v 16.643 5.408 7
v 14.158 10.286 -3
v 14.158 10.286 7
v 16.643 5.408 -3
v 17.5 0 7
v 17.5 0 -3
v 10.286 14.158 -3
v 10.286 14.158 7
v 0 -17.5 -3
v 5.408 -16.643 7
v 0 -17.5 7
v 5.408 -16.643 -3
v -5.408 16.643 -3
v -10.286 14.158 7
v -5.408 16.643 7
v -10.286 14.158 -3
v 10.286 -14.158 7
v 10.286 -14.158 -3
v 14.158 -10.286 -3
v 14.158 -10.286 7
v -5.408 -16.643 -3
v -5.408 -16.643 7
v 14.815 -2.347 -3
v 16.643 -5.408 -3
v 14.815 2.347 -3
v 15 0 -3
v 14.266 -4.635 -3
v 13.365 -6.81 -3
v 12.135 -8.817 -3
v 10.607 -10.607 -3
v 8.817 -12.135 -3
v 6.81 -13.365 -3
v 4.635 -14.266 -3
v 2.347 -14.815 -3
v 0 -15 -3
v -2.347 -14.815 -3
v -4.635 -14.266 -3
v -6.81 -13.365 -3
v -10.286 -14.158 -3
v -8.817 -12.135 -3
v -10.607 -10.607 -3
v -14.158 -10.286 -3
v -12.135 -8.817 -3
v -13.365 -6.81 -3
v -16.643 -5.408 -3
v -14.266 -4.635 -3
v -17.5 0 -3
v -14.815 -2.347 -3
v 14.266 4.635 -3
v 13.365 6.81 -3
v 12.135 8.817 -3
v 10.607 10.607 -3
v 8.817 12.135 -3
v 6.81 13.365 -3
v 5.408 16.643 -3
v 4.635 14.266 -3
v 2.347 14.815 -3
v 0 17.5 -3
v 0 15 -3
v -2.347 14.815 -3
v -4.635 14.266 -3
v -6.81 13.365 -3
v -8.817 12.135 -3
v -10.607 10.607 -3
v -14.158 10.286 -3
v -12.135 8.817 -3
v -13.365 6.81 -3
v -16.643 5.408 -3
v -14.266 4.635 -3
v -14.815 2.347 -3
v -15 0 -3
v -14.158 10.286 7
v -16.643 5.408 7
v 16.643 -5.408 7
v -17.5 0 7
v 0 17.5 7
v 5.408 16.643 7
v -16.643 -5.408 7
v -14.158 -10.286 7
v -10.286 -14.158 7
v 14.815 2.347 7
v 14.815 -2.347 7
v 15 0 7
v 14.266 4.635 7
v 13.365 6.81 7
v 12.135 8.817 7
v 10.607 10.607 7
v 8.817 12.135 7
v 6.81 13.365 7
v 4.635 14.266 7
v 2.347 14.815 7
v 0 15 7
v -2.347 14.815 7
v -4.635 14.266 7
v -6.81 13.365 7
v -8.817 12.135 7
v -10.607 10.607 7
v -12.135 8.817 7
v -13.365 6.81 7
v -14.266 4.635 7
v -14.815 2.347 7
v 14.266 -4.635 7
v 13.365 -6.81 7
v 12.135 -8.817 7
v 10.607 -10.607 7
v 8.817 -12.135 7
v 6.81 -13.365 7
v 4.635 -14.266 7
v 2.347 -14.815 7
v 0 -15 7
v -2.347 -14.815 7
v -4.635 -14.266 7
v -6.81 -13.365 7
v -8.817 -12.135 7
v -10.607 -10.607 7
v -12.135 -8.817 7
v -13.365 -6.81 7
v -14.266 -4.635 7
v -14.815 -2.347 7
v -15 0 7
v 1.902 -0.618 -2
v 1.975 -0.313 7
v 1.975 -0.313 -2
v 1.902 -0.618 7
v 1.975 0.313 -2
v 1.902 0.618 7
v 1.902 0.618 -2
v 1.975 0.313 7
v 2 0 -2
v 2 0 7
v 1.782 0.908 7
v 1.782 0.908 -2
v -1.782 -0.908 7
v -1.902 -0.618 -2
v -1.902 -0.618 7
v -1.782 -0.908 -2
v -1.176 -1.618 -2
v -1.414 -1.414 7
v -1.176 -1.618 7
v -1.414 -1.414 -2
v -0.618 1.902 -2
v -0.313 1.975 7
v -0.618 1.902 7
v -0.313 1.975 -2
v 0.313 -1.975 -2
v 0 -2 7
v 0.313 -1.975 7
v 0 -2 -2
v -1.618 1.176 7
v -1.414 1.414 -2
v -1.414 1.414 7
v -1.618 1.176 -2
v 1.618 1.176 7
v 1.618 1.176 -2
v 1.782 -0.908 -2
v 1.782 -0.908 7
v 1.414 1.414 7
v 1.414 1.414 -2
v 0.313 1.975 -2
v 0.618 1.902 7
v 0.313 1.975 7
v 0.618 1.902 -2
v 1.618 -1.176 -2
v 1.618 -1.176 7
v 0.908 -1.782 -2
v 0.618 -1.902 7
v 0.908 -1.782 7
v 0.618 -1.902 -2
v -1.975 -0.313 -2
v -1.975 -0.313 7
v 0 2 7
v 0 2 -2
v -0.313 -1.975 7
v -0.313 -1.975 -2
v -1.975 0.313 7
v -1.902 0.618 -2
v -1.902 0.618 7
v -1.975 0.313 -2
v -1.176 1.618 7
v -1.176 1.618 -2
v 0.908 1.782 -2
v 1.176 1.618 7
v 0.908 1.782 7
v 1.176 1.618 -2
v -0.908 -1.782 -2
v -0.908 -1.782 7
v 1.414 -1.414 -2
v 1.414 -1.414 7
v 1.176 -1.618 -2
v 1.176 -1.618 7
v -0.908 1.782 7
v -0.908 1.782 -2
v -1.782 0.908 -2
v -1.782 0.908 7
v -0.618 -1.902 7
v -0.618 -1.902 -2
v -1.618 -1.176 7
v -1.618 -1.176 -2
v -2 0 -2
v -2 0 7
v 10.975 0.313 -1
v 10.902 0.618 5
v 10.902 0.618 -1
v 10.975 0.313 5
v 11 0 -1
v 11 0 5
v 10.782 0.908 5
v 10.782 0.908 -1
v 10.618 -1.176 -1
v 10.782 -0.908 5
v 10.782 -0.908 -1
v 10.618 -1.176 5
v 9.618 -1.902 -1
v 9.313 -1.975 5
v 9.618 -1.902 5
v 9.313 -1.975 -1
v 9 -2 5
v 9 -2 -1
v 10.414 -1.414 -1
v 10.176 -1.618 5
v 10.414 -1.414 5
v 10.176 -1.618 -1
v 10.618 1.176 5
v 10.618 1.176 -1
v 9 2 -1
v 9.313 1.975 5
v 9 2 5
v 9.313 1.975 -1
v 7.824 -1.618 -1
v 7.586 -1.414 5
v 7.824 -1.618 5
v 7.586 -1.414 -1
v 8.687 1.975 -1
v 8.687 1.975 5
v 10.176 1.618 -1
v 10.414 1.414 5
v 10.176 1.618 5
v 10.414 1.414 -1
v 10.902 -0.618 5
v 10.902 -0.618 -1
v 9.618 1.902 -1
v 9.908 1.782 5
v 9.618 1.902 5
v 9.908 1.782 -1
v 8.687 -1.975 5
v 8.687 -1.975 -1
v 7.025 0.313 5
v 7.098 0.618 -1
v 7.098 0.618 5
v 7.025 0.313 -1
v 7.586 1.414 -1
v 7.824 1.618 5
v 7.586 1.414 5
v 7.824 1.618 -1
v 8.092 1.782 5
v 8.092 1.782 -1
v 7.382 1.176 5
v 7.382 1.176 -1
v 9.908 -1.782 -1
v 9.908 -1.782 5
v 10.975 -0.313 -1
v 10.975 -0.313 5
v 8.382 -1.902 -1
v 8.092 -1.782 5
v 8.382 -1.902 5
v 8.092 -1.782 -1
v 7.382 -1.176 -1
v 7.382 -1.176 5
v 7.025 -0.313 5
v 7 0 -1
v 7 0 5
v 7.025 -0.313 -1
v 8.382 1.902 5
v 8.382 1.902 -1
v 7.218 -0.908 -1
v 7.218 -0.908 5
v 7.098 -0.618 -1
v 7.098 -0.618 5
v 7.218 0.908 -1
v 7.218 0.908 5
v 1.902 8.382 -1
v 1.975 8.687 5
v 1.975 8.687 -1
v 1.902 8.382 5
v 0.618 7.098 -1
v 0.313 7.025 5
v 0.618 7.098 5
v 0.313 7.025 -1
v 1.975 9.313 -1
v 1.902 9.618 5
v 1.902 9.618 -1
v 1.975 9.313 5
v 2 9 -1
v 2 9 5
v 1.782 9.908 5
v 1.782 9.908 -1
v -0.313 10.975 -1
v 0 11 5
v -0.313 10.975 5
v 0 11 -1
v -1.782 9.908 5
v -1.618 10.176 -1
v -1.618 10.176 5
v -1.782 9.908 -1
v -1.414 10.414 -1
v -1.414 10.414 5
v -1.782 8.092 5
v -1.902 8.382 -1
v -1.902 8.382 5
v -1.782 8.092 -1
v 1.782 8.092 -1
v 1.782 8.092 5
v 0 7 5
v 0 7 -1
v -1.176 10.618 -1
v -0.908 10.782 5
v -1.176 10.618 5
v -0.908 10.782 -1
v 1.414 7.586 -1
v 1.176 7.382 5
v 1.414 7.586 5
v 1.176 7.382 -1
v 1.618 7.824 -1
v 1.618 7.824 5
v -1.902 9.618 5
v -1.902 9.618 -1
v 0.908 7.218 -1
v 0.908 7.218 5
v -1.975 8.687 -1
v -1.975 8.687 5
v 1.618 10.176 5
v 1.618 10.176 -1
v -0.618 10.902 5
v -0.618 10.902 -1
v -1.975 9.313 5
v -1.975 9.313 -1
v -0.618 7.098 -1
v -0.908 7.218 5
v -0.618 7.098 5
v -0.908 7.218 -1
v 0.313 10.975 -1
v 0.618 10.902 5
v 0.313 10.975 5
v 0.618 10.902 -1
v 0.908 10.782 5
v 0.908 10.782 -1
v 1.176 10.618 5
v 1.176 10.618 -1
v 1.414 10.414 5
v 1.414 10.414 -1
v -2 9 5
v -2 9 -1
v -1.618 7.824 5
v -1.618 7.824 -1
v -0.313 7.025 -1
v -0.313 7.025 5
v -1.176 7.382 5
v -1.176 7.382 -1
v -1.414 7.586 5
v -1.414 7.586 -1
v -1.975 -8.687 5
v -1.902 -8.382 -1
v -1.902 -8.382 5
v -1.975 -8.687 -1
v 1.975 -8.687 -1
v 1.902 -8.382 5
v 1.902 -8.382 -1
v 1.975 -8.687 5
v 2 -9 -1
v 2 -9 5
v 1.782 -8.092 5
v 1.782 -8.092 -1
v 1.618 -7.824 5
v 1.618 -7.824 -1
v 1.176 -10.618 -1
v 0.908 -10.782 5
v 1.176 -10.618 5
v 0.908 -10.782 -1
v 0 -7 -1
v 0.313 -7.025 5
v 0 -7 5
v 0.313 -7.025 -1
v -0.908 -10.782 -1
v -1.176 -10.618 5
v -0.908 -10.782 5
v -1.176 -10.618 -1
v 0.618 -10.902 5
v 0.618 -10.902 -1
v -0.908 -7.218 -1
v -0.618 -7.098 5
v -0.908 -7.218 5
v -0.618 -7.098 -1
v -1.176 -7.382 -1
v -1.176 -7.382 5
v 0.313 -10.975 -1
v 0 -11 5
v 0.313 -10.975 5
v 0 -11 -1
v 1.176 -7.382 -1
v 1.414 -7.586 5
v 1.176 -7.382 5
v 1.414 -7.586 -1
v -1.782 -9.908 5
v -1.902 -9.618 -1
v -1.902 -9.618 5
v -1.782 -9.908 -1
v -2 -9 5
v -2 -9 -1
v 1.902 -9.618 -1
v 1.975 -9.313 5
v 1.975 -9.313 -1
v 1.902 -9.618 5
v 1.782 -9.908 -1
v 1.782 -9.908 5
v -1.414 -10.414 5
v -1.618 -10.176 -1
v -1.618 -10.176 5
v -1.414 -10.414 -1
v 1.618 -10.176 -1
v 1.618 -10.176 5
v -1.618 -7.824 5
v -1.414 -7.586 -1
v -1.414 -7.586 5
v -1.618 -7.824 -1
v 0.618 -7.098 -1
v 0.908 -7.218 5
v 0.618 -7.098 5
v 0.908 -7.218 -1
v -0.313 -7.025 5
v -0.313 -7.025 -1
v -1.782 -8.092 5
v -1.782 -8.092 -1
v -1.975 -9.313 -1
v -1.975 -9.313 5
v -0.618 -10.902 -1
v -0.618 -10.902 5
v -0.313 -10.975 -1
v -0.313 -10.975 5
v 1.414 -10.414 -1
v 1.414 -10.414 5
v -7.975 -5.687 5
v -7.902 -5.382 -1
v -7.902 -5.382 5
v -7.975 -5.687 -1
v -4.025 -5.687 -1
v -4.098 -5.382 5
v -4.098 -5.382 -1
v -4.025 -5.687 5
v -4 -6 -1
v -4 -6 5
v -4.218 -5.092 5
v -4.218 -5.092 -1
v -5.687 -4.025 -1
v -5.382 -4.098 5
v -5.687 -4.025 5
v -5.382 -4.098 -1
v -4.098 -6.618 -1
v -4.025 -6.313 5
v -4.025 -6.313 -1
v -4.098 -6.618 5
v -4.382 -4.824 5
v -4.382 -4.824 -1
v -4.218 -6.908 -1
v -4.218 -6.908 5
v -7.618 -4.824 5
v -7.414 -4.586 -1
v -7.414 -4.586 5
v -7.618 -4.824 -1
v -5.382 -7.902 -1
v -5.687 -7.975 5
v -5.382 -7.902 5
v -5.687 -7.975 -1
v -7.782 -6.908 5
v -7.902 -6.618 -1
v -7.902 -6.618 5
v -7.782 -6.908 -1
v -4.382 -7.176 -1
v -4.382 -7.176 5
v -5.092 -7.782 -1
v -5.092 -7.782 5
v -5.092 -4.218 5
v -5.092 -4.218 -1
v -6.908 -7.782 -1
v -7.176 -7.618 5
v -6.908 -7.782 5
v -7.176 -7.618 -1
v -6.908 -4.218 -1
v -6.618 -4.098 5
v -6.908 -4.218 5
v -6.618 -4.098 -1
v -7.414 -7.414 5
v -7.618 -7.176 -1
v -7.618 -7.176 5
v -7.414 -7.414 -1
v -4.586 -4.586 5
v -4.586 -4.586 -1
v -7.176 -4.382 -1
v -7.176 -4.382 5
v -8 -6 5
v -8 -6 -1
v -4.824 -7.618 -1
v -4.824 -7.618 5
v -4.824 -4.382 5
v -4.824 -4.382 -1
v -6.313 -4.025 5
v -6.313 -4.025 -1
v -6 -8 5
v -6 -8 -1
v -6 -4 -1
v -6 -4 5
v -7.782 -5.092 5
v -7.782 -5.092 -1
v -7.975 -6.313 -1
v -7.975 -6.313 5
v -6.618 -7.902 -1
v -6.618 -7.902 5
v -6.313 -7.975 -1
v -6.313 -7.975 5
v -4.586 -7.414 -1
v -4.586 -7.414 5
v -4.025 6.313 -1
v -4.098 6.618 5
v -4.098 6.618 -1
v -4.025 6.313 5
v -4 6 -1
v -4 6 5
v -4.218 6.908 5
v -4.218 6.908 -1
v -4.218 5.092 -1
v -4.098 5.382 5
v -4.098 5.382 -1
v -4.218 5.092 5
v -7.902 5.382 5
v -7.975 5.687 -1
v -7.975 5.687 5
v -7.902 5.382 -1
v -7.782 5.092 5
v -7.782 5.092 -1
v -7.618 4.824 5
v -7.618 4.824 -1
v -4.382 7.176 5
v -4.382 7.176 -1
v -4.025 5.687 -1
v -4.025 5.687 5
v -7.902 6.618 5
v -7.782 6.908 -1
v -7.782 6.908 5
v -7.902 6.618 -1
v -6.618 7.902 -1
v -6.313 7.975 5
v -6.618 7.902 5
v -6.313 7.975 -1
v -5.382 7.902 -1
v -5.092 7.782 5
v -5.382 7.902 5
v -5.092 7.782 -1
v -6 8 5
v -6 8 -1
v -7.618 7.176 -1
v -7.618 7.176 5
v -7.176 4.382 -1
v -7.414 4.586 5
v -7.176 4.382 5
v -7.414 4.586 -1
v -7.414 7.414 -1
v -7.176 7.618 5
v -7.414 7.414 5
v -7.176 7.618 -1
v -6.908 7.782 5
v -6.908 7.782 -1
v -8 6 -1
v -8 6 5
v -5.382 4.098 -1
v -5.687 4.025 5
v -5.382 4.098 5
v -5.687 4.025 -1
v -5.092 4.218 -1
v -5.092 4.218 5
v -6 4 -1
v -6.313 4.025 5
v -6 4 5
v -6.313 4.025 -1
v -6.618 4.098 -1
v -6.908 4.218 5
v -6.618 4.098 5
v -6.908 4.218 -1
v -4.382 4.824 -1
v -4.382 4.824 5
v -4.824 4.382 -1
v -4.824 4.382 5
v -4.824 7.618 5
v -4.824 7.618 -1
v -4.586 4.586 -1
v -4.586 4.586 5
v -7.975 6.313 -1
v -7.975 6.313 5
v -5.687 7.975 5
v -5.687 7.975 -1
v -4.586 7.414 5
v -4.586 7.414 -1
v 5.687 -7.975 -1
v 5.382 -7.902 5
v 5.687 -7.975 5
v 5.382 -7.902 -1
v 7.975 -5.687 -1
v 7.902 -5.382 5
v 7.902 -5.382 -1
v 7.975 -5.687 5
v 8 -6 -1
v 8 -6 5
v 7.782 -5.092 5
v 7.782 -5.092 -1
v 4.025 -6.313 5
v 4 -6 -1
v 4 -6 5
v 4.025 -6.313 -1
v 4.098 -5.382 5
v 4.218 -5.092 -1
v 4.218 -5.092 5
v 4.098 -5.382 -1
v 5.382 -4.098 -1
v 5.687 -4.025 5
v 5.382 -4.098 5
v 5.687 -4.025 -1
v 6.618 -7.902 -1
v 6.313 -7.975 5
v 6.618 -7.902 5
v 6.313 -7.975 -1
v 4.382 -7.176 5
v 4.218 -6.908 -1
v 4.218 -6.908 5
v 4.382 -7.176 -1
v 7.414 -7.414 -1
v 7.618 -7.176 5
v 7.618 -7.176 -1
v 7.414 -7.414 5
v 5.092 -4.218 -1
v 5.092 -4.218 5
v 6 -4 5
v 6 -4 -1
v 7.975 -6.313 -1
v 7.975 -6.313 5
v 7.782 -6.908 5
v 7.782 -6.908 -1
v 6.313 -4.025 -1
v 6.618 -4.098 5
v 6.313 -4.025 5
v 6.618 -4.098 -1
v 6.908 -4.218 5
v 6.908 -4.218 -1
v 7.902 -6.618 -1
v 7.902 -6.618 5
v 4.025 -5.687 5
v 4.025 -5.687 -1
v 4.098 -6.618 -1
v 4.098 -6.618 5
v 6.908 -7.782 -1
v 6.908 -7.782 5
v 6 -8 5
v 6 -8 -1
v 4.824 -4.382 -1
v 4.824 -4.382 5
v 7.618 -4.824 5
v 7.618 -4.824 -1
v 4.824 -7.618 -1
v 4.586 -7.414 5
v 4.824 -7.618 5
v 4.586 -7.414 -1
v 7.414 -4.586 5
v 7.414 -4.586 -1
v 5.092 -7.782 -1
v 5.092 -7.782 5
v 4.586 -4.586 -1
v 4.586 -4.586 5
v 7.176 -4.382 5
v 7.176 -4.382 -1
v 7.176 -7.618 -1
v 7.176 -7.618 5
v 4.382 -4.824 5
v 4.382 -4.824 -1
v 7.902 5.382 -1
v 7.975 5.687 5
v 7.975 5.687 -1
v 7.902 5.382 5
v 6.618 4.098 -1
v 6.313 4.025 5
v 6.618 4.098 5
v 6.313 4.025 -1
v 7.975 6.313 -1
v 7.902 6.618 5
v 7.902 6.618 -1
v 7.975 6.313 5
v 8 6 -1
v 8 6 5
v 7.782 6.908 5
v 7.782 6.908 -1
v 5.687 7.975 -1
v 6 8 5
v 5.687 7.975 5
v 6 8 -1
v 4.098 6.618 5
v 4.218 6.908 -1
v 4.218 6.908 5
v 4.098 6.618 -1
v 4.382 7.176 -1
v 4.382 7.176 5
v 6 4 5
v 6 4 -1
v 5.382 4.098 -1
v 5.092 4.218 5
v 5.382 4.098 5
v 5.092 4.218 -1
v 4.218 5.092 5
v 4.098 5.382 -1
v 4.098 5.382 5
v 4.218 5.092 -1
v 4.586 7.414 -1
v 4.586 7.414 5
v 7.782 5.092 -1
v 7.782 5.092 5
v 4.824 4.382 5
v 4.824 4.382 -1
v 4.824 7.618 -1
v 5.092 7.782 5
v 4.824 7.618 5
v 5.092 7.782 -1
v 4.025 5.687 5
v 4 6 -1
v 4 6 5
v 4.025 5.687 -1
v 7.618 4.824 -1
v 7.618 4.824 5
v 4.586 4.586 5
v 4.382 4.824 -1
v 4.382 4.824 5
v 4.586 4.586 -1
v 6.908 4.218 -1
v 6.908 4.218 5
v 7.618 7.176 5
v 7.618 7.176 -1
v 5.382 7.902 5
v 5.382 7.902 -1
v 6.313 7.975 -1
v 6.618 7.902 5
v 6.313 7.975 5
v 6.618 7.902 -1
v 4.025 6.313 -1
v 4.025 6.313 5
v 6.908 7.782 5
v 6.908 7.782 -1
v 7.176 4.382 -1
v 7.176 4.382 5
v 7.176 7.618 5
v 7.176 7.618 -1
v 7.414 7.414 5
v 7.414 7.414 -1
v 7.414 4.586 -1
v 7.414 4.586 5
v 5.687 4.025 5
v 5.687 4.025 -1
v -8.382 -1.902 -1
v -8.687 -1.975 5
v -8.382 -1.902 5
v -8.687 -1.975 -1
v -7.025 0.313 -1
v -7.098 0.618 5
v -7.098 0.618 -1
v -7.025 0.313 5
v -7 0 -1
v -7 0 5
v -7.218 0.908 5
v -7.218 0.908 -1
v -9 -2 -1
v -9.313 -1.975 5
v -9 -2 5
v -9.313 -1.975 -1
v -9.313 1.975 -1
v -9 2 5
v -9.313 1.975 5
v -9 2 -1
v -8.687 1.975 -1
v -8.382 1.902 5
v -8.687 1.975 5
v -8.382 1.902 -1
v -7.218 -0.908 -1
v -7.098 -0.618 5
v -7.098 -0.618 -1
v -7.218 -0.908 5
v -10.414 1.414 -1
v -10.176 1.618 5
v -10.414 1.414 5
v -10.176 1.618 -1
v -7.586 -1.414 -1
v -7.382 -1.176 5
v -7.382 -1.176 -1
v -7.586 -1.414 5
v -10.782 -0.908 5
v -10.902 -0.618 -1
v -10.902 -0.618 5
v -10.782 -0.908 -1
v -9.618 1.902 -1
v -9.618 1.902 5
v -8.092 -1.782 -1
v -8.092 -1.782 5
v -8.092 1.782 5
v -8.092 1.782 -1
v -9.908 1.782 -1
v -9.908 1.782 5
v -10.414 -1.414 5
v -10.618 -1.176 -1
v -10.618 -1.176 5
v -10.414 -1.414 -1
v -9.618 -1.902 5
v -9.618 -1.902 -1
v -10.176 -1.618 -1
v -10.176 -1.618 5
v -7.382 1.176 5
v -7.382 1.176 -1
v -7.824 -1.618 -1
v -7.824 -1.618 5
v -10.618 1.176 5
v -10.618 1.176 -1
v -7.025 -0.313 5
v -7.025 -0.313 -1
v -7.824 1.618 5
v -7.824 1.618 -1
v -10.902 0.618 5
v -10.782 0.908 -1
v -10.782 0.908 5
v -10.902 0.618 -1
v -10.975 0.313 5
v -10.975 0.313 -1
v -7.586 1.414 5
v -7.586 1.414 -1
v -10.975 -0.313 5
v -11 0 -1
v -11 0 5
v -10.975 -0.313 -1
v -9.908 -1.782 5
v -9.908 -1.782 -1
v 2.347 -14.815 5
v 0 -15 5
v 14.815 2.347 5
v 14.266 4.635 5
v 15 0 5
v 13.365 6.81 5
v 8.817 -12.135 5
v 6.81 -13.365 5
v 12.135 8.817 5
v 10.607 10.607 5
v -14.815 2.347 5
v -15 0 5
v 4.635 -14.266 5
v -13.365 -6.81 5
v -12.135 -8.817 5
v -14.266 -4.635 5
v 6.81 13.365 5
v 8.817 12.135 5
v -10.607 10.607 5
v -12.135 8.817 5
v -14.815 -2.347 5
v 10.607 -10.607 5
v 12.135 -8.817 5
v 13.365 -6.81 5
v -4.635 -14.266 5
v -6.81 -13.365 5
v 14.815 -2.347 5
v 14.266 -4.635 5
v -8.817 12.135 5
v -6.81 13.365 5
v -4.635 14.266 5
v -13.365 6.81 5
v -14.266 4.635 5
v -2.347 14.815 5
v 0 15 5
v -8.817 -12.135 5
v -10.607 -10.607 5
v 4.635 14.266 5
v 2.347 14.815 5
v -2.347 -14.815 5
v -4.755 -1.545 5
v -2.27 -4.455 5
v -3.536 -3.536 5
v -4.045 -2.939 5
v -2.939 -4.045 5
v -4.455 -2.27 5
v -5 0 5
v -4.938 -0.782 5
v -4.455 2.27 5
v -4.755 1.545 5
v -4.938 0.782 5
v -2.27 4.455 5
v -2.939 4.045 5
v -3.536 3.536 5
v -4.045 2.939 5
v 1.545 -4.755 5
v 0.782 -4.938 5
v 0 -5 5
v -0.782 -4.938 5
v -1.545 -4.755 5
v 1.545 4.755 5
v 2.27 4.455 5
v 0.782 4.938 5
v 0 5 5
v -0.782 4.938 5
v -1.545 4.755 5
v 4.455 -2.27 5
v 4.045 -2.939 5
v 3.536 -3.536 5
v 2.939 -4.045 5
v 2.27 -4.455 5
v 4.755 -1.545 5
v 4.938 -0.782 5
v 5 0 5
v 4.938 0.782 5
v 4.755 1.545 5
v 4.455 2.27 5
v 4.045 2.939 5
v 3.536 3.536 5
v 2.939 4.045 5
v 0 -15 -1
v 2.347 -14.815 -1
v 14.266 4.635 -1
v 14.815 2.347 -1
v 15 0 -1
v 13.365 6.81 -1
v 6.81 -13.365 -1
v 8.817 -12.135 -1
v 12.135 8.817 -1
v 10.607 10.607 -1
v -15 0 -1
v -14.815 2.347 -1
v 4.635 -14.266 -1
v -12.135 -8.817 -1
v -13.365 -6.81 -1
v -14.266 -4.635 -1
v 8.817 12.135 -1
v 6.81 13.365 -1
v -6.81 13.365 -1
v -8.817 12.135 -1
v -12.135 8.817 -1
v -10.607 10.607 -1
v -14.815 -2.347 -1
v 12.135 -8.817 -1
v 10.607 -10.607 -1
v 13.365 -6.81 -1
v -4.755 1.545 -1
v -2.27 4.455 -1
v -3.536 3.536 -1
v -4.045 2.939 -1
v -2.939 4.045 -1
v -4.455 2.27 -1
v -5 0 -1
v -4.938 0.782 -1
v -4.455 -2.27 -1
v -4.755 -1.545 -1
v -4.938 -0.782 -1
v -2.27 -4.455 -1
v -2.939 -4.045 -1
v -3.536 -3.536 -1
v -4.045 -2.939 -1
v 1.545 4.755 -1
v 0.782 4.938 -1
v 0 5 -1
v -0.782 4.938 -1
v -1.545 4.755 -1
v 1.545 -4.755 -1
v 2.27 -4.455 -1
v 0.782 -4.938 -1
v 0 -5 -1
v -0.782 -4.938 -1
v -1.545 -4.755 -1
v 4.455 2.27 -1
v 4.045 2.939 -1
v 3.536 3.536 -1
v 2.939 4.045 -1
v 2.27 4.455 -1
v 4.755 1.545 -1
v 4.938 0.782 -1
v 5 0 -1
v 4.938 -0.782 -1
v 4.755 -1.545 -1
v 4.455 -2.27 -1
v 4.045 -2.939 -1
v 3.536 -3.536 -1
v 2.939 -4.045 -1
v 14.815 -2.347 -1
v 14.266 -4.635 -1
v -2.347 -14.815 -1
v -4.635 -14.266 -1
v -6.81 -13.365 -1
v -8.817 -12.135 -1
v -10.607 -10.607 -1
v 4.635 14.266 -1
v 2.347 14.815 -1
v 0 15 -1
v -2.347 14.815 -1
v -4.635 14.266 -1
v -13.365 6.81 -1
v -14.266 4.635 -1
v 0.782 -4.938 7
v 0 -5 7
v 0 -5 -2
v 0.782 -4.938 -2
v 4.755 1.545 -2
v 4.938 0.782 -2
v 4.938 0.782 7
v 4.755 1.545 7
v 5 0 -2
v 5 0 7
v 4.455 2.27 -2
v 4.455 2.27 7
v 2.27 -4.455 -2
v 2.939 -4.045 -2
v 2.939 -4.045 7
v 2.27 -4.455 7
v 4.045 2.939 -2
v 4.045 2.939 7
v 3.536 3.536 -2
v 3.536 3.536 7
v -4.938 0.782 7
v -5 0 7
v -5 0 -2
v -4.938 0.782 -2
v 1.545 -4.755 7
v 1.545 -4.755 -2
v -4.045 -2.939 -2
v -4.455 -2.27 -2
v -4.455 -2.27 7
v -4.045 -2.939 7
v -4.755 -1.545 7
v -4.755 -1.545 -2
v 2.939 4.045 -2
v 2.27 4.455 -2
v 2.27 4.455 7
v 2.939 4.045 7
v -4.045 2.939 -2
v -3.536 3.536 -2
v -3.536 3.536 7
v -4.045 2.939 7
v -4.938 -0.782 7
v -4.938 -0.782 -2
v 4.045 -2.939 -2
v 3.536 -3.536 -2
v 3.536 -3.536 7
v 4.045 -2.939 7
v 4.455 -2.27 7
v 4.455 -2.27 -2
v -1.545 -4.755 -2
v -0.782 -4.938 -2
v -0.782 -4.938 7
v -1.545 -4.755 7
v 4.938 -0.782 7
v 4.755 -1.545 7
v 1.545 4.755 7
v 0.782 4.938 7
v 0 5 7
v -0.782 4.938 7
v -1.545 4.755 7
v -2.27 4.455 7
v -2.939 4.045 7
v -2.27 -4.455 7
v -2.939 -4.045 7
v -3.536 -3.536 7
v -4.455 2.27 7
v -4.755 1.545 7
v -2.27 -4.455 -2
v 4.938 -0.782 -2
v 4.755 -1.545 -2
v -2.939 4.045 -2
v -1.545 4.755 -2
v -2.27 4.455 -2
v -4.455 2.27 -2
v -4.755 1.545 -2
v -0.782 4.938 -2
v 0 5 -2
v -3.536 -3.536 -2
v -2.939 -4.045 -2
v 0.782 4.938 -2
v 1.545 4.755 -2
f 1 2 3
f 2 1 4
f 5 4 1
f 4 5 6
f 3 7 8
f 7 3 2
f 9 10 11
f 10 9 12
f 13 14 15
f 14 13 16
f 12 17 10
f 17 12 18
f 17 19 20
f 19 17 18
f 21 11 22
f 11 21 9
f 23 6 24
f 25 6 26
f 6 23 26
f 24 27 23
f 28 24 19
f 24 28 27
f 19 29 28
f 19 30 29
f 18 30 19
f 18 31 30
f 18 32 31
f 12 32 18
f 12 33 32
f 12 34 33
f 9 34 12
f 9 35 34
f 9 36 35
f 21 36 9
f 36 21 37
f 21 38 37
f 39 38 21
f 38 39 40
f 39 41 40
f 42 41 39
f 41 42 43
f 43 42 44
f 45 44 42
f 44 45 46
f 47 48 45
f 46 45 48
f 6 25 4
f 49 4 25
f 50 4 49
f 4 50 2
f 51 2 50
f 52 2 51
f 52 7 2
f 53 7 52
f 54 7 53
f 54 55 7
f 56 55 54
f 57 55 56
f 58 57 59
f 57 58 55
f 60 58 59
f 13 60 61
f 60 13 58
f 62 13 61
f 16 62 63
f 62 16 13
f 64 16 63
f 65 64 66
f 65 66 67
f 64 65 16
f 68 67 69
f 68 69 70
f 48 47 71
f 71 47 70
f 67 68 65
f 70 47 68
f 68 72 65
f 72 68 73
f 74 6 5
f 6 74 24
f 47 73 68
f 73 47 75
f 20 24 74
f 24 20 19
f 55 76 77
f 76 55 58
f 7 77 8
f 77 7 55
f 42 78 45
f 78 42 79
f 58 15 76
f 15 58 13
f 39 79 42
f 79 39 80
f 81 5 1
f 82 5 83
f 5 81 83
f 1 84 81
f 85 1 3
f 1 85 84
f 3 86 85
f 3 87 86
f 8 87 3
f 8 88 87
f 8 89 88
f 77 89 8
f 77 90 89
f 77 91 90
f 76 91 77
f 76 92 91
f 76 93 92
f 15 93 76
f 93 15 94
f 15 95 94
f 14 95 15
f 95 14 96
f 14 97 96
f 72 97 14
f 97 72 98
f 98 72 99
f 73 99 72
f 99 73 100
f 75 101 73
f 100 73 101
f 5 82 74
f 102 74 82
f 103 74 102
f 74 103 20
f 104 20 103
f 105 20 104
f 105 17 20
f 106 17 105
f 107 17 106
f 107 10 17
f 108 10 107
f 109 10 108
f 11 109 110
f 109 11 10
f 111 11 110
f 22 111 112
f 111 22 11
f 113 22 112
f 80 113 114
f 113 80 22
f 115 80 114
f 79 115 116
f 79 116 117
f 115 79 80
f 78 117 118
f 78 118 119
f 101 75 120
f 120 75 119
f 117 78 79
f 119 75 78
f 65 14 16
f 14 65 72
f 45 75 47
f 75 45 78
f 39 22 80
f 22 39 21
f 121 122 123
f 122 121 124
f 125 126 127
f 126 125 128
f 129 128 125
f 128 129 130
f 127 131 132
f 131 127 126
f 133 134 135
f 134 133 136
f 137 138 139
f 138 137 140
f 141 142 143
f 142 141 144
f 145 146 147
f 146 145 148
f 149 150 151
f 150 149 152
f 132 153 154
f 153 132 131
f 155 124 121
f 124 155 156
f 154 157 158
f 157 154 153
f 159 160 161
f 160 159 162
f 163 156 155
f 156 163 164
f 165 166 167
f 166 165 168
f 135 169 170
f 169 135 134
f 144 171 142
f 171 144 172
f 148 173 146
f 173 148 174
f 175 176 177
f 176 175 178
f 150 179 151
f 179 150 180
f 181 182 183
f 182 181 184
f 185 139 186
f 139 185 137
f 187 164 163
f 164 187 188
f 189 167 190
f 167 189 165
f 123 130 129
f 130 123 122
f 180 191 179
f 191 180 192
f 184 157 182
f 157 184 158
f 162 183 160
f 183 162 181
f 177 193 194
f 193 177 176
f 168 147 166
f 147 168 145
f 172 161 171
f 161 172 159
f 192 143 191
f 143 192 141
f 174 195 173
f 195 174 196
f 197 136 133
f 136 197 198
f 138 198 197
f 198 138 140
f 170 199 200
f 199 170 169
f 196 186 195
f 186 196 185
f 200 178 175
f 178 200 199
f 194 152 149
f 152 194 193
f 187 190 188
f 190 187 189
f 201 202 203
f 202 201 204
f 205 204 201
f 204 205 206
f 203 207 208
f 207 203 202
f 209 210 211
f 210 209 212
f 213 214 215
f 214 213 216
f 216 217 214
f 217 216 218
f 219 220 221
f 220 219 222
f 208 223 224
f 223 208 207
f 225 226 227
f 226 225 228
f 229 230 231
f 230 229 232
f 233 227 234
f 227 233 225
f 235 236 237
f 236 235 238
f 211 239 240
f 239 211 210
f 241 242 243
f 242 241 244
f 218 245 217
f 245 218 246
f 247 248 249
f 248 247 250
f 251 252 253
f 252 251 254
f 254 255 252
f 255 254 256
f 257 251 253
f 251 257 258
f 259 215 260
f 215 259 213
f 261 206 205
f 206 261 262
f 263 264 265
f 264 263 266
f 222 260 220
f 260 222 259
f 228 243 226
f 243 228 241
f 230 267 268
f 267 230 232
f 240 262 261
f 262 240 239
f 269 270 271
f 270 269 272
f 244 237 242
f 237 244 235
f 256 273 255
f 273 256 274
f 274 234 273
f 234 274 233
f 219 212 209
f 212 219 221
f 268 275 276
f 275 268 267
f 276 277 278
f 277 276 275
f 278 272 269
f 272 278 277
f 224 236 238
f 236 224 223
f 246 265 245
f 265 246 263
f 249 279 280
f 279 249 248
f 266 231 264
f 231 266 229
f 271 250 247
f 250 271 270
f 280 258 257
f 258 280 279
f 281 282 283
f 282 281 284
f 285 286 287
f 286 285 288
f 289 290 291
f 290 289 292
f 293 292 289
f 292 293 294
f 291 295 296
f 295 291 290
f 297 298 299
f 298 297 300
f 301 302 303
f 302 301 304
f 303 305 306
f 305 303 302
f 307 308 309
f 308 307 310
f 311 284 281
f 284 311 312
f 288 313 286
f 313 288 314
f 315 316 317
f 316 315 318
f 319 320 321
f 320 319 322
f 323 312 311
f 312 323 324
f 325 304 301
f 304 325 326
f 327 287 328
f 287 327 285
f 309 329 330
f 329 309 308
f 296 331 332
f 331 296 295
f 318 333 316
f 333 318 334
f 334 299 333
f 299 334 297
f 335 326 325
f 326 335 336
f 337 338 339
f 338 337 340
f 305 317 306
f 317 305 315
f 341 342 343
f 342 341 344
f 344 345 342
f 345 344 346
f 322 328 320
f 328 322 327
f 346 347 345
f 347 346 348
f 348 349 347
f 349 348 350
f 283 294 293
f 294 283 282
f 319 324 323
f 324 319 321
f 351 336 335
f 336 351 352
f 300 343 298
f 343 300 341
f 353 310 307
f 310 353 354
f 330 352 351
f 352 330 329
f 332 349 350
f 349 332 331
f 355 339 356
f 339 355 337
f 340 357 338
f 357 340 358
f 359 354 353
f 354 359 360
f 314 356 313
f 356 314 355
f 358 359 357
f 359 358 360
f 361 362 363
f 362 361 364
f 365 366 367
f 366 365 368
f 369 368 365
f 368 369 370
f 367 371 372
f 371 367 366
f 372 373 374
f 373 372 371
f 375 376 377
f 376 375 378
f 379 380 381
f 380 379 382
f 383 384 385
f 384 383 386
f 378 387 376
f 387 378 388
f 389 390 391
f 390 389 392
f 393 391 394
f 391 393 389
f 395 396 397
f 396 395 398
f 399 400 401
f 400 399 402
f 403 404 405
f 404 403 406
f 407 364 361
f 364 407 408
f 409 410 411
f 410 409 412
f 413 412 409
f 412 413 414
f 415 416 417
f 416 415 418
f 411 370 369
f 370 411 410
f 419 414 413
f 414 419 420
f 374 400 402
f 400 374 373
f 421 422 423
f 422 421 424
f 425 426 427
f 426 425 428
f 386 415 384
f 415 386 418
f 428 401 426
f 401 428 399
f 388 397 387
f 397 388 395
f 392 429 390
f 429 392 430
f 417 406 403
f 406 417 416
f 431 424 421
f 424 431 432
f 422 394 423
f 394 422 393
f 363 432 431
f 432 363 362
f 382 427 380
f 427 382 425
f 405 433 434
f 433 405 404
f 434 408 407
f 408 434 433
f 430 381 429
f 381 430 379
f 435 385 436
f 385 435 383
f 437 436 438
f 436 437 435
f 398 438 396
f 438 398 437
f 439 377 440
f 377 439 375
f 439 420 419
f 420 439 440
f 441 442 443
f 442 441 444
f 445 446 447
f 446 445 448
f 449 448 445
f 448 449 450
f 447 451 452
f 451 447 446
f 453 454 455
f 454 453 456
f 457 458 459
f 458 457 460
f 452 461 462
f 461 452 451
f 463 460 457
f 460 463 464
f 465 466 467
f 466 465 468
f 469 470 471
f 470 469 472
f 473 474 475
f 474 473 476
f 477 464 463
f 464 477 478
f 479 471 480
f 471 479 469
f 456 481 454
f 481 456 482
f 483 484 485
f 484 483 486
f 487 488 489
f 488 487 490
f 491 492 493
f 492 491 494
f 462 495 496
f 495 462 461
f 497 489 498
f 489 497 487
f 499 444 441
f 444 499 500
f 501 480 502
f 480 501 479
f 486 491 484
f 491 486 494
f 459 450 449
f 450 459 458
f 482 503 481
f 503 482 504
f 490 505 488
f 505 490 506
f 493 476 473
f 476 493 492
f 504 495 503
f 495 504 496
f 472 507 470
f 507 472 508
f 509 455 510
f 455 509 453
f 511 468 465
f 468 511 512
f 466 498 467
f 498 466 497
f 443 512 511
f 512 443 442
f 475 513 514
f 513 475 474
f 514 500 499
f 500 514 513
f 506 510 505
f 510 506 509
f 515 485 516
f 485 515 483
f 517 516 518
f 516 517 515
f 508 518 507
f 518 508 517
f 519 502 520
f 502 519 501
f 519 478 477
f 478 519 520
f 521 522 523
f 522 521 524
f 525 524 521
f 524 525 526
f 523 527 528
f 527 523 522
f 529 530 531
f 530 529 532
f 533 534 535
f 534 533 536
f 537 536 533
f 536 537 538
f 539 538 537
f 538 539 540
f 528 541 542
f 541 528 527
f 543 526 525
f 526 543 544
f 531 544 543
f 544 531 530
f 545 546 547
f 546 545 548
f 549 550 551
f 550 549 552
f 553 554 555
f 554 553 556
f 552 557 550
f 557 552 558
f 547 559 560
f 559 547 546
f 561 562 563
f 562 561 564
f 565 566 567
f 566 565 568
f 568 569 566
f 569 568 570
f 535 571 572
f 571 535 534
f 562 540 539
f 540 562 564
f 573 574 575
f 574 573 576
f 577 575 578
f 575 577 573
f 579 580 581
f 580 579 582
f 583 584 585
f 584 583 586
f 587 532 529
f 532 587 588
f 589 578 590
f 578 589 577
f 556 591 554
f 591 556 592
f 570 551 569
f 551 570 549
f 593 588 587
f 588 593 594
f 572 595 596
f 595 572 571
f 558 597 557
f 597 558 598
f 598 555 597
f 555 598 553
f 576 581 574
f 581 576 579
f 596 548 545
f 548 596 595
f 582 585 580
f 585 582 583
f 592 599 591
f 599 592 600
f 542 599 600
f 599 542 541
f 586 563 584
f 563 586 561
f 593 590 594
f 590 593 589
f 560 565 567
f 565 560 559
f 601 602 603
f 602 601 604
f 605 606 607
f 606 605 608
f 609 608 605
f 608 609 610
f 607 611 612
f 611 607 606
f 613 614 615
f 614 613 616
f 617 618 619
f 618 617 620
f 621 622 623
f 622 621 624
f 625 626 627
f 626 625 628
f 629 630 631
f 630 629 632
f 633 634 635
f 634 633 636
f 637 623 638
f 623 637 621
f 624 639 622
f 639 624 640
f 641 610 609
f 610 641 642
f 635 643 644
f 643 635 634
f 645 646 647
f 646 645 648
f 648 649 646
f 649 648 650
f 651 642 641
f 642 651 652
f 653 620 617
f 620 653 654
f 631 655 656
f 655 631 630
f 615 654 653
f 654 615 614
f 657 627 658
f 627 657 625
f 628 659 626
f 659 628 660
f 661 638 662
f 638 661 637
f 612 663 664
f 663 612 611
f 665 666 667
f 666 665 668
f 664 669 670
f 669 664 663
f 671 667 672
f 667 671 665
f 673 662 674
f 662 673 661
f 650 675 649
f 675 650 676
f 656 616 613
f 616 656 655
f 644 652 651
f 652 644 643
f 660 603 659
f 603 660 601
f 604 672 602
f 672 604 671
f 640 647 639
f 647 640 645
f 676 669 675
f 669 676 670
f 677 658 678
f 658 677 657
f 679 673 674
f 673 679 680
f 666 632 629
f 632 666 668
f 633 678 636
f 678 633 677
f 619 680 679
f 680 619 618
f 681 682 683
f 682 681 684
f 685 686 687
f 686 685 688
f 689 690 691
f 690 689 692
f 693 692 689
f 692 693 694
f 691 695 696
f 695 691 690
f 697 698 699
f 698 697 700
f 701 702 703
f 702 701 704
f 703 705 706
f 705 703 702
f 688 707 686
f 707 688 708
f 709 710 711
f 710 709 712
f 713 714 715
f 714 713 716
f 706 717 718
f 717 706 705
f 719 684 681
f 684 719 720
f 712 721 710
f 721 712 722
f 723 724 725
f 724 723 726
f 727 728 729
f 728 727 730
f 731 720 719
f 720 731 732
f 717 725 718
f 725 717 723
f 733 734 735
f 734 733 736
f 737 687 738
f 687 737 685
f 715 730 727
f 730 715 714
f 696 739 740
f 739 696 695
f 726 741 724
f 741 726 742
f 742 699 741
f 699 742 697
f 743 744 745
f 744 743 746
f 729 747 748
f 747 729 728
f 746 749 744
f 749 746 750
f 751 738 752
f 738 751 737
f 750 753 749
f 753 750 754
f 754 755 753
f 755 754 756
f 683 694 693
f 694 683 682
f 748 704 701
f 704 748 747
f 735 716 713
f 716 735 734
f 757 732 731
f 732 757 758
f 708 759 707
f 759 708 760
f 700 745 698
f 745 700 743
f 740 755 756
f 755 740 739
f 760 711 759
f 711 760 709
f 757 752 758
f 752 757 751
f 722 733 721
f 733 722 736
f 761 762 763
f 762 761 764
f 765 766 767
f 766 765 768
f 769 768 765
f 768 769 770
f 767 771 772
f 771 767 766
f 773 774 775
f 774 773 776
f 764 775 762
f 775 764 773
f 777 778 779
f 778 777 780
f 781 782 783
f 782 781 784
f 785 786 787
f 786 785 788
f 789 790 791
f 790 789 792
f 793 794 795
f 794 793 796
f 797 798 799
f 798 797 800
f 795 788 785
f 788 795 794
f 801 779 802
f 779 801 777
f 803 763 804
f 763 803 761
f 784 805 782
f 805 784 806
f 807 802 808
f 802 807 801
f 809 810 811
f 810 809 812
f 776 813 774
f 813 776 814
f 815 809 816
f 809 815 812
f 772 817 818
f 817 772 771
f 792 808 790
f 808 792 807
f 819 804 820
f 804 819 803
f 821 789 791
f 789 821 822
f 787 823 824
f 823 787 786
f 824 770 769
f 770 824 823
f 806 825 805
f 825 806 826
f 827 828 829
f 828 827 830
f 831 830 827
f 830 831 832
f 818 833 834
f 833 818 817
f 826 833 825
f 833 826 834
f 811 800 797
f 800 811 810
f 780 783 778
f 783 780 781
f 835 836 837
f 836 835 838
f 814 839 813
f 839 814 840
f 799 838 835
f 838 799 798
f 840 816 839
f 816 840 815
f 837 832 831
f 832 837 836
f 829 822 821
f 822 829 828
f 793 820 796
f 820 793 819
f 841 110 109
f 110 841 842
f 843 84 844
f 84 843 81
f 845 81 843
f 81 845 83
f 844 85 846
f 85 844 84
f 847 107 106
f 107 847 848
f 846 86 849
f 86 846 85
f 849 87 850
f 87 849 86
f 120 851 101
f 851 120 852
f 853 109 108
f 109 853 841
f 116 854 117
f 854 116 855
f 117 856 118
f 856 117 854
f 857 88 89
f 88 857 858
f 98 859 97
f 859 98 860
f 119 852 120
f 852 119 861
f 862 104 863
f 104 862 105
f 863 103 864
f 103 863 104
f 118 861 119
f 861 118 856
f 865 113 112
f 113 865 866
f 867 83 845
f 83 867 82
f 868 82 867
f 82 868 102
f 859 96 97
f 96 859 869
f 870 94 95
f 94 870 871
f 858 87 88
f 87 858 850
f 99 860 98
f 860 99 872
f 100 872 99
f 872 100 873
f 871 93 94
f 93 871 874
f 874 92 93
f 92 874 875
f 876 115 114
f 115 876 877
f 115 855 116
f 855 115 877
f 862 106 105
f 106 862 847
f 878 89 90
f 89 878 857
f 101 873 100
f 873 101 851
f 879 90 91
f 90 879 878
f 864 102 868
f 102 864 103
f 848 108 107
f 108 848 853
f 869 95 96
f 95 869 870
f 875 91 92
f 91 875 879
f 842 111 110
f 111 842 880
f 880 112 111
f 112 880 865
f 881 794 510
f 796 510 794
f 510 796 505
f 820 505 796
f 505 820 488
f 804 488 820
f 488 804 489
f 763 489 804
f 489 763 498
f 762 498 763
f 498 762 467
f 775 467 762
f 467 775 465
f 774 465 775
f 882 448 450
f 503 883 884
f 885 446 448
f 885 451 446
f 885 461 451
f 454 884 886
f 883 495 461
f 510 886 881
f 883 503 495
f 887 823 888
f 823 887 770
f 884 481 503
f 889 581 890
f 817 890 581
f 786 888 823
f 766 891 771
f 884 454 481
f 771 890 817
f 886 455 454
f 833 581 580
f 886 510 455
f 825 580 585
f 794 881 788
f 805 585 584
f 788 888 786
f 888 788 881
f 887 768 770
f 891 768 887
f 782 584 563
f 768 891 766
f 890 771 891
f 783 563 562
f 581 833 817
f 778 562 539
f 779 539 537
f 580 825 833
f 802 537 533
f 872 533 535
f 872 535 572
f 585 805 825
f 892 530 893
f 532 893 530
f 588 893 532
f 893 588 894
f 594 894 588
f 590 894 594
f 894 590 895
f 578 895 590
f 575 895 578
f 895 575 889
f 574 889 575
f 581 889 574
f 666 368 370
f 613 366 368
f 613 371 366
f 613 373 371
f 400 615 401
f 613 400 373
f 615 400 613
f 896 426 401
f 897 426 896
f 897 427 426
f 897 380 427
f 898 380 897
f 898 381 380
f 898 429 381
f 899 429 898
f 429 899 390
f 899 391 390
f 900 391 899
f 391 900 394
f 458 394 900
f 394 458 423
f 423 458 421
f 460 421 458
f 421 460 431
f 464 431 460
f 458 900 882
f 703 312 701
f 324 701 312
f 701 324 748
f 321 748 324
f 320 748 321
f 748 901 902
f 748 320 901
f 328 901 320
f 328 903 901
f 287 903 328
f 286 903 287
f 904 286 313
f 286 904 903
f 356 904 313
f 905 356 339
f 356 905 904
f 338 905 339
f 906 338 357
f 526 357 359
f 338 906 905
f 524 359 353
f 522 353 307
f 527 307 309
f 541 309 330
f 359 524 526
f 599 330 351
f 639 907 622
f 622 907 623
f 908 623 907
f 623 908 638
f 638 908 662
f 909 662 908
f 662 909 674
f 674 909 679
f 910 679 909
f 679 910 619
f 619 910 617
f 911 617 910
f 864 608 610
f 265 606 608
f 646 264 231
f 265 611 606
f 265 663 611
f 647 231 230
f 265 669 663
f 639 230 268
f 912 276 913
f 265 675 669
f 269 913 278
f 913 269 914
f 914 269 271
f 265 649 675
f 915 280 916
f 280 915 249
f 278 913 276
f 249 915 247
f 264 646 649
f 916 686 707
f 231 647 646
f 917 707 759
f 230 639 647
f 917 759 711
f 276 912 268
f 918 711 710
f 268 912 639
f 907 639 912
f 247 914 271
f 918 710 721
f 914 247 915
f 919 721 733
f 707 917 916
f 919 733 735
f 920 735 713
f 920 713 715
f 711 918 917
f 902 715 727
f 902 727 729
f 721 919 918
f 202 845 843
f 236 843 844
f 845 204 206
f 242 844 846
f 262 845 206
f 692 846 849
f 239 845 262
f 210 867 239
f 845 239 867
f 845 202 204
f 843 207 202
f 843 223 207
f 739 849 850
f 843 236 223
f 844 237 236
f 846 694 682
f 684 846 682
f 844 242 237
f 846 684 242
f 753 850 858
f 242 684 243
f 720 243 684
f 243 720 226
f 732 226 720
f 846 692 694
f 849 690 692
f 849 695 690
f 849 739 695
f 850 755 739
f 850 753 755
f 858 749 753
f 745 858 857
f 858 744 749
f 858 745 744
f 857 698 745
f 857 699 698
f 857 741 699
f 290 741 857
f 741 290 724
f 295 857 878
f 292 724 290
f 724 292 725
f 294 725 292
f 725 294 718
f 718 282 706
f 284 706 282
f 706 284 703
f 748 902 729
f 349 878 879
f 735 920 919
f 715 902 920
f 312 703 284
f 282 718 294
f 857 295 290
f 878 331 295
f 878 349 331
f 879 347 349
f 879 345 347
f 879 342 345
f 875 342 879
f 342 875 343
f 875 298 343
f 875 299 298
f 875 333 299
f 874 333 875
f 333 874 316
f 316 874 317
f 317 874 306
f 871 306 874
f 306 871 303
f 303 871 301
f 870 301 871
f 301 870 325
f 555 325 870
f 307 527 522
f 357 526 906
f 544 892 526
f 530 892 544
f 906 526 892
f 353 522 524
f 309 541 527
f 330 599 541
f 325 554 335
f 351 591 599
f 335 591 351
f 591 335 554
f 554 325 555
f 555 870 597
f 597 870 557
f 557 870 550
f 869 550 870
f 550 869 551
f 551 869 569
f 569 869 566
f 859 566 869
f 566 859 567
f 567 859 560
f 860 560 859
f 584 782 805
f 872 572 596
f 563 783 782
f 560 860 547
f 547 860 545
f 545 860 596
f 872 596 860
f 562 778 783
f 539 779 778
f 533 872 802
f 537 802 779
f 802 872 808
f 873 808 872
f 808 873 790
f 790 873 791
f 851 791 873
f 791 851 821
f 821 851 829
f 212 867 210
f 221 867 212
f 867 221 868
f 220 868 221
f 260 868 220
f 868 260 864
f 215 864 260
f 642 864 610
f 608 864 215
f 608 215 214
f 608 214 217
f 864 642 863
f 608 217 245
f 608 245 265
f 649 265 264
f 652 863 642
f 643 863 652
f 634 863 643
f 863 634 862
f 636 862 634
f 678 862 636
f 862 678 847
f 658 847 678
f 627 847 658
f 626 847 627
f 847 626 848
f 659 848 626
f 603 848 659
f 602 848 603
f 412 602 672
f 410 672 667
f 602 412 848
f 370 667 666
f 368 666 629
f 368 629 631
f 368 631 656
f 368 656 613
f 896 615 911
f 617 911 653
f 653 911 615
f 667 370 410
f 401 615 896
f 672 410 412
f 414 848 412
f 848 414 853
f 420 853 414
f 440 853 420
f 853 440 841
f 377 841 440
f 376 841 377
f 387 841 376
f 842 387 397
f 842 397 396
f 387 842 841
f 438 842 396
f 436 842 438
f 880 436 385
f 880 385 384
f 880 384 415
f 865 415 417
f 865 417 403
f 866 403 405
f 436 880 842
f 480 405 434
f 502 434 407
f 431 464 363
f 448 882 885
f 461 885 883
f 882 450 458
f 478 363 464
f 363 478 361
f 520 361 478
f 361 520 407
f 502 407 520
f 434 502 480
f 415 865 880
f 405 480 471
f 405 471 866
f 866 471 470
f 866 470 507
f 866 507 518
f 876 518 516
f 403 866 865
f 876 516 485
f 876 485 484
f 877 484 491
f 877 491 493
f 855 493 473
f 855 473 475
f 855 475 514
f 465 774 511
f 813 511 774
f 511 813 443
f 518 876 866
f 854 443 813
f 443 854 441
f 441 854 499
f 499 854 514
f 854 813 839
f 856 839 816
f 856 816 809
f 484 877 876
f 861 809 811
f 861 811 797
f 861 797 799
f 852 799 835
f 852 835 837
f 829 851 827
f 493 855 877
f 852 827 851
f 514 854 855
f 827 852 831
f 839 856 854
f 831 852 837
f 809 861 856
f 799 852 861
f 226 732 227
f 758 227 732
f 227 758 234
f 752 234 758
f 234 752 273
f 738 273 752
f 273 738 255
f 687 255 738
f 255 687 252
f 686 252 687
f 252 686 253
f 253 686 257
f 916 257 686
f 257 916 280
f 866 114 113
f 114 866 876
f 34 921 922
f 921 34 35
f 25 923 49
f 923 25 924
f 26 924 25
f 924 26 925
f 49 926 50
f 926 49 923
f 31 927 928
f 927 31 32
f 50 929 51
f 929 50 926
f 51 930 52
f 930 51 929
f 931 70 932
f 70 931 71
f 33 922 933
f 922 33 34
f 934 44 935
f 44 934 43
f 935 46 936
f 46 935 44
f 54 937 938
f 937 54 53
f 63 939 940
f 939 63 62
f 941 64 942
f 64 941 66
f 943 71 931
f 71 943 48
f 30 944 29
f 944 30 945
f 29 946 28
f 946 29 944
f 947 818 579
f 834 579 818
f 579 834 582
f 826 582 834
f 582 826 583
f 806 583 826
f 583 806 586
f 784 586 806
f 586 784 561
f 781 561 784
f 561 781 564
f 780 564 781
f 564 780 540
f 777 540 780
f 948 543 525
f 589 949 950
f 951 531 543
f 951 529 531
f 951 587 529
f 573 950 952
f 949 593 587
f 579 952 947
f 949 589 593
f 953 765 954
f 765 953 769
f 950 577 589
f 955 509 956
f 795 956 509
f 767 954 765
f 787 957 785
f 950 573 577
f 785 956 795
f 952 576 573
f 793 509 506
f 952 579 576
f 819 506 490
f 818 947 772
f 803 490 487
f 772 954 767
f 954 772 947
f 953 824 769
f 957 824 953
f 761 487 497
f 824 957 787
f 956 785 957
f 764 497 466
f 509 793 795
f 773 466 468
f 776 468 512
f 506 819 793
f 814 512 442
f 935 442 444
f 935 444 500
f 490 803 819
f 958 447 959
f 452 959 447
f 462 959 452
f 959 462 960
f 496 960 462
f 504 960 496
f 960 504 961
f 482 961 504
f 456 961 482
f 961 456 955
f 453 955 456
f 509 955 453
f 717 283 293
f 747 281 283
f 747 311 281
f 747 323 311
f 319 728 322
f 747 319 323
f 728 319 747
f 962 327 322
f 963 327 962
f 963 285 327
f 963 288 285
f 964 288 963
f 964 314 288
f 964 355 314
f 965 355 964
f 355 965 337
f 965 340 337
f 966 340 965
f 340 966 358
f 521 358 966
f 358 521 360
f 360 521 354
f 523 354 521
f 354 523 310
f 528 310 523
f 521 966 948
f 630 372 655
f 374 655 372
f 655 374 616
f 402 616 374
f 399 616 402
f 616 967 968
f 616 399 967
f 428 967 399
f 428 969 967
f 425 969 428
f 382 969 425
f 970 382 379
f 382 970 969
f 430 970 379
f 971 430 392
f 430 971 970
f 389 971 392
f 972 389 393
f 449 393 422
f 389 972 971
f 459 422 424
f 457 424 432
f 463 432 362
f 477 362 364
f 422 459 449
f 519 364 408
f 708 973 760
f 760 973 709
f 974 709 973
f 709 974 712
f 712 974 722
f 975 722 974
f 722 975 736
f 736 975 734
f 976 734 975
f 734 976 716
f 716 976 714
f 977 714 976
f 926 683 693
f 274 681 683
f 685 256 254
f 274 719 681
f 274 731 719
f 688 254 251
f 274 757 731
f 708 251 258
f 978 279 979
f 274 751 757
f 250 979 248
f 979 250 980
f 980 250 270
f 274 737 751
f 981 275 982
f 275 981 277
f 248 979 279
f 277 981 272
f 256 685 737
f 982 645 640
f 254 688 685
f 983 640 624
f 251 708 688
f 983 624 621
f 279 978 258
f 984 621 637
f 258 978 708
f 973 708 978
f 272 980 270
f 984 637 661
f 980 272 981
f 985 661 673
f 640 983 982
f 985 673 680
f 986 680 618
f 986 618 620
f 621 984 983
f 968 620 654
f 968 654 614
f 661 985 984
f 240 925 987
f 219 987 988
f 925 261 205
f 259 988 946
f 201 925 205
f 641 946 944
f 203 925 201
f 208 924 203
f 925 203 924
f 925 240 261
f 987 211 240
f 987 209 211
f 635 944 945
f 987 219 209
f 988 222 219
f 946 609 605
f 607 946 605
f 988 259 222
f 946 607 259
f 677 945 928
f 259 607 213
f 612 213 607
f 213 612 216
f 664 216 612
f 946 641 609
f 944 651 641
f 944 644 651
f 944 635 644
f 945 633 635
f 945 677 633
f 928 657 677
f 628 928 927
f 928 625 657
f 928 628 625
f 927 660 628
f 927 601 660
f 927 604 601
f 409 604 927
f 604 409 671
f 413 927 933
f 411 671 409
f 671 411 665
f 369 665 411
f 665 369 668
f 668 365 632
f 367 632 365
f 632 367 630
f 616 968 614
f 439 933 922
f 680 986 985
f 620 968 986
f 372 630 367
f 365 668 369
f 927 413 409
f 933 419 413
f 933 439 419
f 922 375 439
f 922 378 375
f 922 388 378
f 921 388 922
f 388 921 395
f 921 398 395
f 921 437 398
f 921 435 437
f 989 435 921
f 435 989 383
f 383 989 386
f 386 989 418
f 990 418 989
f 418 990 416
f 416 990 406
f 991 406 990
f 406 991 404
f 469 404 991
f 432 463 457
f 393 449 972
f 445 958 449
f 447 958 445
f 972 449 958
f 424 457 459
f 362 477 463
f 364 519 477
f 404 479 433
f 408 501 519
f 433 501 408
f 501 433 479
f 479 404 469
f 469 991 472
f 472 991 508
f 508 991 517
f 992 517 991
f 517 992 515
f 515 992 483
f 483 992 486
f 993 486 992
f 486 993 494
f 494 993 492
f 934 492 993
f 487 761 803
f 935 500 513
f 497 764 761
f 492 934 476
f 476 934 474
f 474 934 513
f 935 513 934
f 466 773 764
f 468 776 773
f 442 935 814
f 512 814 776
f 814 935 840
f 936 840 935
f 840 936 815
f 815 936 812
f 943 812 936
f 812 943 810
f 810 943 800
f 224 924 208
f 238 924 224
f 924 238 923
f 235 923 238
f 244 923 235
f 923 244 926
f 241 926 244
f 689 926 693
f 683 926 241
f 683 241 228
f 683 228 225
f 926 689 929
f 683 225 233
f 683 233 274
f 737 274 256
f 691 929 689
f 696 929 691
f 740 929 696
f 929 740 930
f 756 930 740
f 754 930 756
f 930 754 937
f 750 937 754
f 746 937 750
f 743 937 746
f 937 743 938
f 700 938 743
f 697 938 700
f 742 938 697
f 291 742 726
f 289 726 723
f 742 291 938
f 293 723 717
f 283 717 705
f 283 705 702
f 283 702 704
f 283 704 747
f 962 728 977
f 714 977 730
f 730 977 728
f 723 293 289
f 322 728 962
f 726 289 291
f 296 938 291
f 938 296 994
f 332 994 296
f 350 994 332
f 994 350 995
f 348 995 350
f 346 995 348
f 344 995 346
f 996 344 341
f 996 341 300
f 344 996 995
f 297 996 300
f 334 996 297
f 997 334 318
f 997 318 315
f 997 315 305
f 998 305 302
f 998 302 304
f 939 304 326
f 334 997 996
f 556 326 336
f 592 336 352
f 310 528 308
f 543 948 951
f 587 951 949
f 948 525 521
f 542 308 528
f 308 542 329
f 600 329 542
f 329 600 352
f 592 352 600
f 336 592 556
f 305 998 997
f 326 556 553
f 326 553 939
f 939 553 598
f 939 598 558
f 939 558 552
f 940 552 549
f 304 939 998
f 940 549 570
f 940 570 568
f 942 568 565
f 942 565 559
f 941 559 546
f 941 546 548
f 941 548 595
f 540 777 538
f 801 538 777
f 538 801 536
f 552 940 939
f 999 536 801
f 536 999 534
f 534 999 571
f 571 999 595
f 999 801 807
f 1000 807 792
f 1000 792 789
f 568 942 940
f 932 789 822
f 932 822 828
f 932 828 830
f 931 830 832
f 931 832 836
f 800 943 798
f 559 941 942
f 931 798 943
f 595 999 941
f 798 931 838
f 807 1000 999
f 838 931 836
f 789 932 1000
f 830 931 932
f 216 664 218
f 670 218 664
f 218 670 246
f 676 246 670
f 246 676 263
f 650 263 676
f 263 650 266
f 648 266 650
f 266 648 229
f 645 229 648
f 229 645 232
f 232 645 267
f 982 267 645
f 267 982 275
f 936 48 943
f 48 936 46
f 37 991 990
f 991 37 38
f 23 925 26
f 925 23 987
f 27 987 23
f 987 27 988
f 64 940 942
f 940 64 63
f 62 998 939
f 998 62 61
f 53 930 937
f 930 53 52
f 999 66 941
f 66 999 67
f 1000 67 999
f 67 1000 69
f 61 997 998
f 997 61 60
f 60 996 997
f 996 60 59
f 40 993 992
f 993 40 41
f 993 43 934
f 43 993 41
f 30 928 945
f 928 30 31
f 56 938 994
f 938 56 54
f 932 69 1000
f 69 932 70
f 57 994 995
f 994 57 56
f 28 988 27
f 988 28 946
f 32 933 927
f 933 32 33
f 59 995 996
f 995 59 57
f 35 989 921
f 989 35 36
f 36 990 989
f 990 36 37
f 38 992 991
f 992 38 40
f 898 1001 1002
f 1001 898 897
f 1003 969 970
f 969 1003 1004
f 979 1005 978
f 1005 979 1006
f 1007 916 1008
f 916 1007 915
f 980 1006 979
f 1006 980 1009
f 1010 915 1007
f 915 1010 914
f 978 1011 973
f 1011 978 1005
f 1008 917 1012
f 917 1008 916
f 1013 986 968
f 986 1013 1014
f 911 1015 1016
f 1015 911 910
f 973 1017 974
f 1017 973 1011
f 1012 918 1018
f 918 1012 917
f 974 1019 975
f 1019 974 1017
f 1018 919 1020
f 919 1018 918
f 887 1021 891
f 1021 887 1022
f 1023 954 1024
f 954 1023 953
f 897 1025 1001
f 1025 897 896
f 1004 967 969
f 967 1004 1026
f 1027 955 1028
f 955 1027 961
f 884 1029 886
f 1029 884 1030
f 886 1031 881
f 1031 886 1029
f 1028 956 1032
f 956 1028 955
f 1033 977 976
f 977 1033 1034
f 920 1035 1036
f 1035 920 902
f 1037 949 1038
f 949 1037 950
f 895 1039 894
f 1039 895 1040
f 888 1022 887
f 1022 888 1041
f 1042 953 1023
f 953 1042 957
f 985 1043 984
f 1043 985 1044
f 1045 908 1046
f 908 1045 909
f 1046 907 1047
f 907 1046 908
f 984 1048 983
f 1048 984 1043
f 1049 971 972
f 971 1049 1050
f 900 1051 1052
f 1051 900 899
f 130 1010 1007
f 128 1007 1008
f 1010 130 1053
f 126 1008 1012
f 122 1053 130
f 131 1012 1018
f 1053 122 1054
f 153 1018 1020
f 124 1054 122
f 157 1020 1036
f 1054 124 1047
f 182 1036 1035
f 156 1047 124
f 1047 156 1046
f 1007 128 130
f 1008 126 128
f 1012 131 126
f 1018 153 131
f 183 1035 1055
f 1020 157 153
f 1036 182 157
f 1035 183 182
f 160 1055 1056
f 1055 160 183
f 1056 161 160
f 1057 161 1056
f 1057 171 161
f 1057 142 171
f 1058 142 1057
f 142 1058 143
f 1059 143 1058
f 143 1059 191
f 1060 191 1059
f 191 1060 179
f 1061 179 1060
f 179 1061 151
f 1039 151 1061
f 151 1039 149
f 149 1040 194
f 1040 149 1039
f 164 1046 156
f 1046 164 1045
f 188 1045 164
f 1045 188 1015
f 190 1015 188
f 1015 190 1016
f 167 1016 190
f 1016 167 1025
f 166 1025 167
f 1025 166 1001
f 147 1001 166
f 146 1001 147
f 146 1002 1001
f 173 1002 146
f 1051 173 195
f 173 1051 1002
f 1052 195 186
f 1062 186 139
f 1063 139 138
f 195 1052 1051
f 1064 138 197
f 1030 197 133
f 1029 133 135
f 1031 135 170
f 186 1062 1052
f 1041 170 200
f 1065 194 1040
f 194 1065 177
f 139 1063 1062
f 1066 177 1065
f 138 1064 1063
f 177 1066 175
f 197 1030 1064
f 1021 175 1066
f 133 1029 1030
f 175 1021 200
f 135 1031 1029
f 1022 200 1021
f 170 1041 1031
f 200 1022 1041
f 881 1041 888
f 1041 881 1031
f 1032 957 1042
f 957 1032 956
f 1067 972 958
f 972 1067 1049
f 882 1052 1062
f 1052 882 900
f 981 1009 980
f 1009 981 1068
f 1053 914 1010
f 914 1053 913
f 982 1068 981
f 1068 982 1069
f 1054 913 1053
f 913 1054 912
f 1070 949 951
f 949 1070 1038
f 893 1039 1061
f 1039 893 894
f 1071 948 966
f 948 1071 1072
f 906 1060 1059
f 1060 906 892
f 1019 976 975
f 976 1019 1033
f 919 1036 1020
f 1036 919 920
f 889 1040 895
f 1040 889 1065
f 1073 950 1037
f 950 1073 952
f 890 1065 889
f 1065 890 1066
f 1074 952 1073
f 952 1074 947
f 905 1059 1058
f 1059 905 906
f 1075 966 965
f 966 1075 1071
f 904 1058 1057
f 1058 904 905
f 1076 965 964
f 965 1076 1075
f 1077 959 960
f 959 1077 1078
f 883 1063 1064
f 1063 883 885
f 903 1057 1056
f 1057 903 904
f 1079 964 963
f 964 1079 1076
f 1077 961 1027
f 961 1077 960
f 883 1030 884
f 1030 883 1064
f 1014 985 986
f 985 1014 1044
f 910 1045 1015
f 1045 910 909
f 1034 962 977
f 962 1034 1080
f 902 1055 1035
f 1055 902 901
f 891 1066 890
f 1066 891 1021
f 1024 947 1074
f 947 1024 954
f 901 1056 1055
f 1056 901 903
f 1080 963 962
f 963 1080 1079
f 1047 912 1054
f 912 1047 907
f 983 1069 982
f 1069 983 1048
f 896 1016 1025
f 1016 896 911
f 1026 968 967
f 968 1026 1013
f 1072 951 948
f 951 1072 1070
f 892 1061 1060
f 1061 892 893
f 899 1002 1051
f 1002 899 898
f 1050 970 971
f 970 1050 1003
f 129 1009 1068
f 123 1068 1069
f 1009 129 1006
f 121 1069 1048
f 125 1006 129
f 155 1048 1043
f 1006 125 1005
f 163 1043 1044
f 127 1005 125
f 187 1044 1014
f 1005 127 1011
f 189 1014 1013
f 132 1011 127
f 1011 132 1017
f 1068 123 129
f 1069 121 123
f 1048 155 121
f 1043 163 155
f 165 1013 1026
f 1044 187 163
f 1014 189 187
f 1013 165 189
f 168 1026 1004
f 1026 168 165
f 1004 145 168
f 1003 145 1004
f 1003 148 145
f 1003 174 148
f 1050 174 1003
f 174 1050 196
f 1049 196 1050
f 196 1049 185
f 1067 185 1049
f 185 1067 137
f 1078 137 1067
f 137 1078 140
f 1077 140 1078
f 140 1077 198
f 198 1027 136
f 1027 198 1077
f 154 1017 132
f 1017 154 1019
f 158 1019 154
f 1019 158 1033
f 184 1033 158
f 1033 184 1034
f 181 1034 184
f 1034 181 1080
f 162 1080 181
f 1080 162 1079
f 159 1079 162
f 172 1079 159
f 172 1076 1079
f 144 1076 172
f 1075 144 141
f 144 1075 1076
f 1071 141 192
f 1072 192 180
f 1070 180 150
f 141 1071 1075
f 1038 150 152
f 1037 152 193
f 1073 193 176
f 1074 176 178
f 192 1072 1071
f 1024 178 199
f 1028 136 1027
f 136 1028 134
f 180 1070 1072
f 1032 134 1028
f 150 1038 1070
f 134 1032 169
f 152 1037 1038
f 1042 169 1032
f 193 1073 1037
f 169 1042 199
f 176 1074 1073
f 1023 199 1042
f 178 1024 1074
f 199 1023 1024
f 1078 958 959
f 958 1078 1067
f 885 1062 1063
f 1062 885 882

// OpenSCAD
fn = 40;
h = 15;
d = 4;

rueda();

module rueda(){
  translate([0,0,2])
  cuerpoPrincipal();
  tuercaCentral();
}


module cuerpoPrincipal(){
  
    difference(){
      // Cilindro original
      translate([0,0,0])
        cylinder (h = 10, d = 35, center = true,$fn=20);

      // Agujeros 
      translate([0,0,0])
        cylinder (h = h, d = d, center = true,$fn=fn);
 
      translate([9,0,0])
        cylinder (h = h, d = d, center = true,$fn=fn);
 
      translate([0,9,0])
        cylinder (h = h, d = d, center = true,$fn=fn);

      translate([0,-9,0])
        cylinder (h = h, d = d, center = true,$fn=fn);
 
      translate([-6,-6,0])
        cylinder (h = h, d = d, center = true,$fn=fn);
 
      translate([-6,6,0])
        cylinder (h = h, d = d, center = true,$fn=fn);
 
      translate([6,-6,0])
        cylinder (h = h, d = d, center = true,$fn=fn);
 
      translate([6,6,0])
        cylinder (h = h, d = d, center = true,$fn=fn);
 
      translate([-9,0,0])
        cylinder (h = h, d = d, center = true,$fn=fn);
        
       //Hueco superior
      translate([0,0,5])
       cylinder (h = 4, d = 30, center = true,$fn=fn);
 
      // hueco inferior
      translate([0,0,-5])
        cylinder (h = 4, d = 30, center = true,$fn=fn);
    }
}

module tuercaCentral(){
    
    difference(){
    translate([0,0,2.5])
      cylinder (h = 9, d = 10, center = true,$fn=fn);
      
    translate([0,0,2.5])
      cylinder (h = h, d = d, center = true,$fn=fn); //agujero central
  }
}
